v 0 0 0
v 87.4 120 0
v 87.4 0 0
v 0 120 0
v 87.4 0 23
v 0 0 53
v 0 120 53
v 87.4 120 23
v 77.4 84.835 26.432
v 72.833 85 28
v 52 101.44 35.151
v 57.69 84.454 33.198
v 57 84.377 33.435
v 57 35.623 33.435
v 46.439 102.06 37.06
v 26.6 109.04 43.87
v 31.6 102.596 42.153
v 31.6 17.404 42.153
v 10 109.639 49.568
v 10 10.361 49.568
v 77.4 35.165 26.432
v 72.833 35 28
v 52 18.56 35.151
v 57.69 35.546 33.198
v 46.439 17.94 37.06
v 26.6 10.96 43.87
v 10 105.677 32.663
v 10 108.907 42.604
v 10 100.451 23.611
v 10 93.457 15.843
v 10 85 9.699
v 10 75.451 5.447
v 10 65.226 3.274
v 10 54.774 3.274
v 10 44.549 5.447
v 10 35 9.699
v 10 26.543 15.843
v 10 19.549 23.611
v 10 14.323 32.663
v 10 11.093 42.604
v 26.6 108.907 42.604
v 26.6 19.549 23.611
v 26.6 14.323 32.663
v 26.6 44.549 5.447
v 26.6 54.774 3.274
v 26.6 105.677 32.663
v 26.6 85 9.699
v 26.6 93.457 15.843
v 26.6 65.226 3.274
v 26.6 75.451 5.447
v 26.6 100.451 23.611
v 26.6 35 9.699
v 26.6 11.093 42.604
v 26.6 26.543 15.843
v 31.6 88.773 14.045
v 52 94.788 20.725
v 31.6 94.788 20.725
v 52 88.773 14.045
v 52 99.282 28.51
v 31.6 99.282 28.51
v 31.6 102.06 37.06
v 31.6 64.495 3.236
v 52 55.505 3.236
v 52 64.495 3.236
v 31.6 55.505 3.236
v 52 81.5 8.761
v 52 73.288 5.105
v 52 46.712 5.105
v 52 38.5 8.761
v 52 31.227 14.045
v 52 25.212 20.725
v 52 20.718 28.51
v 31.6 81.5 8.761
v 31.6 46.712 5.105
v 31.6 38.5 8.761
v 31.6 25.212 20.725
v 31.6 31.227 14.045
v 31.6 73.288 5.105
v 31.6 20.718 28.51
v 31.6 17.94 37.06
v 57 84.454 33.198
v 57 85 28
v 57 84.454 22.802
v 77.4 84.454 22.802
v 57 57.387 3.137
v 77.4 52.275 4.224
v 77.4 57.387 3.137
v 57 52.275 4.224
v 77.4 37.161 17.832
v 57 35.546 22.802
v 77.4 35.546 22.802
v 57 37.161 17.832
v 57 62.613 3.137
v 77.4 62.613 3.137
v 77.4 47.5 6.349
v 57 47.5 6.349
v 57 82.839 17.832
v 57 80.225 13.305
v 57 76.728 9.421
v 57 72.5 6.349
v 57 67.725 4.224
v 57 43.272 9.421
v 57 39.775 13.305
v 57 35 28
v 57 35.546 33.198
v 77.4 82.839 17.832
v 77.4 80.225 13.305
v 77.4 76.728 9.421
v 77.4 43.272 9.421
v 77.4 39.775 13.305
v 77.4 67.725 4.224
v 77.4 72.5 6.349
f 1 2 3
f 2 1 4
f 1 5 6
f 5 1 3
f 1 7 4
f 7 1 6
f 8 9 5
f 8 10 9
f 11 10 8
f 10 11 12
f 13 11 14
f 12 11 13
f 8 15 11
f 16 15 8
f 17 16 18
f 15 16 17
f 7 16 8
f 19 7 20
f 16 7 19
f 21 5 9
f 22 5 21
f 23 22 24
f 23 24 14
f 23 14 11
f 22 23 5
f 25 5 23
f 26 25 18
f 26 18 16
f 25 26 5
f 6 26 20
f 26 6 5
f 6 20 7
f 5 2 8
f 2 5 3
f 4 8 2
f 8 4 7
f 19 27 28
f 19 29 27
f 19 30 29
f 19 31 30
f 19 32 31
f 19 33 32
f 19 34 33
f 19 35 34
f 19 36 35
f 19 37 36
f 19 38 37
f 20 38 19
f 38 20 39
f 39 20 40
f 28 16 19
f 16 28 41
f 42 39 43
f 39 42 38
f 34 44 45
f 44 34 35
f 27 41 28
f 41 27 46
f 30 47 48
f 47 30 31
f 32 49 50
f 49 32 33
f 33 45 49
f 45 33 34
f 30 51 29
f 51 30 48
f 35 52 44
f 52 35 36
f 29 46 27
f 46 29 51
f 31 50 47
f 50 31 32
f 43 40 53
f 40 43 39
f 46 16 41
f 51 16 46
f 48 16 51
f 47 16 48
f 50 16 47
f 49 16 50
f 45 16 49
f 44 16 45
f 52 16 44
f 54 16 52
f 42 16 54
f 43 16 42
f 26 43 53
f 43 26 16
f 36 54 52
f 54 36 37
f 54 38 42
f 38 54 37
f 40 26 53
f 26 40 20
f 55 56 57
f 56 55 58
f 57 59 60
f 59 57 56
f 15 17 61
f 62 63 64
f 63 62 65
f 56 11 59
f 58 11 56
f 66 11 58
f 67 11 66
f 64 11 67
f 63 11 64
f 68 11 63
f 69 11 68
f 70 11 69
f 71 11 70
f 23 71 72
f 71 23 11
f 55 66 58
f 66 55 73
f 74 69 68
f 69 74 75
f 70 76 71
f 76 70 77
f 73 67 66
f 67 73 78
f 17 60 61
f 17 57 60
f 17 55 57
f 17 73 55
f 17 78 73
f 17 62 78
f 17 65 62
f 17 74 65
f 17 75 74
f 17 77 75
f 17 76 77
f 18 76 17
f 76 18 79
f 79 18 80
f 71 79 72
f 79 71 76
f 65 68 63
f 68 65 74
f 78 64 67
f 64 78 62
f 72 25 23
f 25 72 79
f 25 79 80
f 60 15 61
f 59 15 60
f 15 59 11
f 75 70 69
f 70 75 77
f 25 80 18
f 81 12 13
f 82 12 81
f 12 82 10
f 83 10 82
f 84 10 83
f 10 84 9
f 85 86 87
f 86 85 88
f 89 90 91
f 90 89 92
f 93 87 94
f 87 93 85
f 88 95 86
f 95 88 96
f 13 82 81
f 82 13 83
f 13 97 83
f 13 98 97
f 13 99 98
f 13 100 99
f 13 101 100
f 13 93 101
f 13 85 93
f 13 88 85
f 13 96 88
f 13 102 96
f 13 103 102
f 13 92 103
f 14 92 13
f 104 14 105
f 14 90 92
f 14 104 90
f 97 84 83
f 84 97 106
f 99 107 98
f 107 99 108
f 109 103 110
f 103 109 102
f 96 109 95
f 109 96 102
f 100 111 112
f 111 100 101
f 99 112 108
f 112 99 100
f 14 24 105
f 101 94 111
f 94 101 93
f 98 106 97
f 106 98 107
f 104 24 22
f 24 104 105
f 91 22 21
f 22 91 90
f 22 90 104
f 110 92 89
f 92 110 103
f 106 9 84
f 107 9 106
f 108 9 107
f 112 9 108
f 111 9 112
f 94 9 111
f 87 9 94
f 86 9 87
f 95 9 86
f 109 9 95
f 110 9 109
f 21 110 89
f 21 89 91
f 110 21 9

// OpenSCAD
// Organizador Lupas 3 tamaños
// PPF - 2016 09 Madrid
// version 01
// Unidades en mm

// Parametrización
// Dimensiones lupas (diámetro y grosor):
LupaG_Diametro= 100;
LupaM_Diametro = 86;
LupaP_Diametro = 50;

LupaG_Grosor = 16.6; //16.6
LupaM_Grosor = 20.4; //20.4
LupaP_Grosor = 20.4; //20.4

// Dimensiones caja:
Delta = 10; // reborde
Fondo = 3; // fondo de la caja
Esquina = 5; // diámetro esquinas
Alto_Superior = 50; // altura mayor
Alto_Inferior = 20; // altura menor

// RENDERIZAR BLOQUE BASE
// Cálculos para el polígono
Lado_X = Delta+LupaG_Grosor+Delta/2+LupaM_Grosor+Delta/2+LupaP_Grosor+Delta; // escribo desglosado para que se entienda mejor
Lado_Y = Delta+LupaG_Diametro+Delta; // segun el diametro mayor
Lado_Z1 = Fondo + Alto_Superior; 
Lado_Z2 = Fondo + Alto_Inferior;

P1 = [0,0];
P2 = [Lado_X,0,];
P3 = [Lado_X,Lado_Z2];
P4 = [0, Lado_Z1];
puntos = [P1,P2,P3,P4]; // array de puntos 2D


difference(){
// RENDERIZAR BLOQUE    
translate ([0,Lado_Y,0])
rotate ([90,0,0]) //rotar prisma para apoyarlo en xy
linear_extrude (Lado_Y) //dotar de volumen
polygon (puntos); //renderizar prisma

//RENDERIZAR LUPAS
// LUPA GRANDE
translate ([Delta, Lado_Y/2, Fondo+LupaG_Diametro/2])
rotate ([90,0,90]) 
cylinder (h=LupaG_Grosor, d = LupaG_Diametro);


// LUPA MEDIA
color("red")
translate ([Delta+LupaG_Grosor+Delta/2, Lado_Y/2, Fondo+LupaM_Diametro/2])
rotate ([90,0,90]) 
cylinder (h=LupaM_Grosor, d = LupaM_Diametro);

// LUPA PEQUEÑA
color ("green")
translate ([Delta+LupaG_Grosor+Delta/2+LupaM_Grosor+Delta/2, Lado_Y/2, Fondo+LupaP_Diametro/2])
rotate ([90,0,90]) 
cylinder (h=LupaP_Grosor, d = LupaP_Diametro);


}
